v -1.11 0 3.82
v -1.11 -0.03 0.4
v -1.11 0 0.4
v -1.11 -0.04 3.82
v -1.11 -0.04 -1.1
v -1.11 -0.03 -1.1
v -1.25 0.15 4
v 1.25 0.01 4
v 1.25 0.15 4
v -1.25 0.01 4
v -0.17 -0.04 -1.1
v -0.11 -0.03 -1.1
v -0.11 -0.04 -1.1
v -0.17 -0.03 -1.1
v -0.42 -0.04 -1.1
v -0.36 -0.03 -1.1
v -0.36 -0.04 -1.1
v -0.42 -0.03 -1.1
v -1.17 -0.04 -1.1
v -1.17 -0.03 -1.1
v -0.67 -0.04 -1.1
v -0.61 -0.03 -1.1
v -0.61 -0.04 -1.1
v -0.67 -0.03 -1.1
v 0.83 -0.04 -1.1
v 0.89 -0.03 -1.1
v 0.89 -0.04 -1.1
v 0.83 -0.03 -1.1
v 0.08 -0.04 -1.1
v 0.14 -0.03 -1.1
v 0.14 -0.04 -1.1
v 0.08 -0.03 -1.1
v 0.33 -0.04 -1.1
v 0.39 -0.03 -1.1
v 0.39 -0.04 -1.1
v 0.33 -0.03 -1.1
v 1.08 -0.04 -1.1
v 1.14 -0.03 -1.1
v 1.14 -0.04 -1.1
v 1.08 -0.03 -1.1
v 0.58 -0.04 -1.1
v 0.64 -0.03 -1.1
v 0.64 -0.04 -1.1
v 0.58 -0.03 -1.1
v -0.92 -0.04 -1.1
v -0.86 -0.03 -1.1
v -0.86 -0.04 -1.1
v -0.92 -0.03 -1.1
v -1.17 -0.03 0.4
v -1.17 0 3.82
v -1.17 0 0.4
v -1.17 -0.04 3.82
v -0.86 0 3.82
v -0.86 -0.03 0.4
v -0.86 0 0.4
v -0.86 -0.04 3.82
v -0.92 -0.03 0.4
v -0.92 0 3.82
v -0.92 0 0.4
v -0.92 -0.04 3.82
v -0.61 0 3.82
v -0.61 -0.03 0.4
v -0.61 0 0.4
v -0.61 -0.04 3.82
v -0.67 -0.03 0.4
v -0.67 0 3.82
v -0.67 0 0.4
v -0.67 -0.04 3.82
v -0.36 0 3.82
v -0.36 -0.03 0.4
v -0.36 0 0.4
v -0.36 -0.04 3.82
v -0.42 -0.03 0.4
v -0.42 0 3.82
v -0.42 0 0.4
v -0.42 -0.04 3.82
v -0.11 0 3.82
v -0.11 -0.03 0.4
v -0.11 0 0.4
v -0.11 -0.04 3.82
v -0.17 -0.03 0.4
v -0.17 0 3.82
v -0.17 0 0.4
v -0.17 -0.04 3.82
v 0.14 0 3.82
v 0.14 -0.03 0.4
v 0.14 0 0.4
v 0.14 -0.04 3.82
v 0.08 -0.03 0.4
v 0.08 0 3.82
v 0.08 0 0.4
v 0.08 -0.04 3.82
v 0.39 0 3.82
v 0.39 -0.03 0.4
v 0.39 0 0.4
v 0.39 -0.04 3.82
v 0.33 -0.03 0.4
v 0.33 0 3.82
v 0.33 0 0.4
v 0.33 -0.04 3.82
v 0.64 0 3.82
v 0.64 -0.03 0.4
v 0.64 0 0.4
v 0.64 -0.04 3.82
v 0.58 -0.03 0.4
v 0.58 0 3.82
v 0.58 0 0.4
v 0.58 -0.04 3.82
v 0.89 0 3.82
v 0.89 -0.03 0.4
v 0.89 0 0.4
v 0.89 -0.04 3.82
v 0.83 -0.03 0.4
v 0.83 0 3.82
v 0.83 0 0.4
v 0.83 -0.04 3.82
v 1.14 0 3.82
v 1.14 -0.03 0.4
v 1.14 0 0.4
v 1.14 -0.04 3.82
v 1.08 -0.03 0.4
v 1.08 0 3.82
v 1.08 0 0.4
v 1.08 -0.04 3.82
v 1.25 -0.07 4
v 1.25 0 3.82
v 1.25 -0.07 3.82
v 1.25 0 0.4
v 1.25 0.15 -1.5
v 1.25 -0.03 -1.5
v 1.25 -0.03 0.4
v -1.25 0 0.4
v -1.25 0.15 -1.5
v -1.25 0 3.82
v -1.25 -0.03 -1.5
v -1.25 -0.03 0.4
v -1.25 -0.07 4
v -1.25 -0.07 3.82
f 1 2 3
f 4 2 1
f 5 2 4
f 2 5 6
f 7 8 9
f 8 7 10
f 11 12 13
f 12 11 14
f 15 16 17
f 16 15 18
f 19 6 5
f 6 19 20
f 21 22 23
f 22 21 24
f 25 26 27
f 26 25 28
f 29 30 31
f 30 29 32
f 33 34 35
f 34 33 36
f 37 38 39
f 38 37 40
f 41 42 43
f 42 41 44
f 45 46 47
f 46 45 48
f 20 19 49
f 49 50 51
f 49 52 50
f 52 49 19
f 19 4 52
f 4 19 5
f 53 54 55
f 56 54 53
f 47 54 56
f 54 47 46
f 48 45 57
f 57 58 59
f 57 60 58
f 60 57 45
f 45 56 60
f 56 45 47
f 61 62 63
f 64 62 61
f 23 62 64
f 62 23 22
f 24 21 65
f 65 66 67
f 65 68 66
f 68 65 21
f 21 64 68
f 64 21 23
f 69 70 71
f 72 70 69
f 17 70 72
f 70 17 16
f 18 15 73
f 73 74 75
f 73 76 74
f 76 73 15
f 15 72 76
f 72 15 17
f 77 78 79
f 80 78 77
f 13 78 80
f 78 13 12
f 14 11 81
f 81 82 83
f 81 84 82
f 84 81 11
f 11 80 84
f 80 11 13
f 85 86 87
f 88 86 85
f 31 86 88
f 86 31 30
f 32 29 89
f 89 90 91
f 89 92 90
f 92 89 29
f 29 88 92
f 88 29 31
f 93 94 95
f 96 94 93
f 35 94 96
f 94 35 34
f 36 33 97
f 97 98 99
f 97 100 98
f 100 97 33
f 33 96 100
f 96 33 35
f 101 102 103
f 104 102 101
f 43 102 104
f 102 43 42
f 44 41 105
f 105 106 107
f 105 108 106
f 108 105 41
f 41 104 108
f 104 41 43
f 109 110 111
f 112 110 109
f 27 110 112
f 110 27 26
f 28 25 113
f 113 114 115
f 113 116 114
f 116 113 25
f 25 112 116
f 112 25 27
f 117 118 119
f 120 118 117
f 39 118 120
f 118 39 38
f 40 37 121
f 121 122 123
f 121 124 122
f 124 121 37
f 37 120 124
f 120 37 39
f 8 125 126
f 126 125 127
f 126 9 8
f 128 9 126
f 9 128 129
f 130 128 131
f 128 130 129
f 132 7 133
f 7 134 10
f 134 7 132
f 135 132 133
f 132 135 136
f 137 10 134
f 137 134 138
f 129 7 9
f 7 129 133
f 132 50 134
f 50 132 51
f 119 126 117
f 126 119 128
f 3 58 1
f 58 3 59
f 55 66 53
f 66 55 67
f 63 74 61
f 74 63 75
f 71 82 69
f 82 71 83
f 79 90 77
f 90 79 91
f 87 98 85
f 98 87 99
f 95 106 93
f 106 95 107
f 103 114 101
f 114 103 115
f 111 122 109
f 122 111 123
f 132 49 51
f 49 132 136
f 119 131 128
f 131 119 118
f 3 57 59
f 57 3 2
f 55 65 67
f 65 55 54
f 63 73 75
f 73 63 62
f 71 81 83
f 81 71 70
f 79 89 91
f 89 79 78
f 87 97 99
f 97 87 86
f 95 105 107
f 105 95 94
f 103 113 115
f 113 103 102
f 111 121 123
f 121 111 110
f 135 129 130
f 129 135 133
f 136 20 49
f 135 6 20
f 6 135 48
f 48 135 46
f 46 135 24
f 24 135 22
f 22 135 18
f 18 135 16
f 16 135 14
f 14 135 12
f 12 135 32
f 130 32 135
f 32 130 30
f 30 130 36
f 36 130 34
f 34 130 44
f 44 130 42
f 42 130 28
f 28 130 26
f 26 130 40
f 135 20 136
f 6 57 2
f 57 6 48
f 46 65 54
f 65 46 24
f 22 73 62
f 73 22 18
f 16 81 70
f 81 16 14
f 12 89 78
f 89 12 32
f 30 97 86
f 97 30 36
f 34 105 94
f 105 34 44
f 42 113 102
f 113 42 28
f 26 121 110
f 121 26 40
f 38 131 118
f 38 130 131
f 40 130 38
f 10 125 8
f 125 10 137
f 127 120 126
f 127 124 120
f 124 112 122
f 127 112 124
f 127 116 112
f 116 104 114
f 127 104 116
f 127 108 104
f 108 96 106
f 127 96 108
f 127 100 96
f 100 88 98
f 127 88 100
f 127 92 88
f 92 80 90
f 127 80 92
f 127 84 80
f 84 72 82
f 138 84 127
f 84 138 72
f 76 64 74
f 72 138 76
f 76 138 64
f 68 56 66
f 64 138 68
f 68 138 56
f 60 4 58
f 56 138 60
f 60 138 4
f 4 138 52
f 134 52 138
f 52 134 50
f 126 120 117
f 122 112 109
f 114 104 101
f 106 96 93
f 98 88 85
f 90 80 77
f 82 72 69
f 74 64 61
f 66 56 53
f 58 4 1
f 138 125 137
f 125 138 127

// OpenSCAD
// Shed shell kit: wall. See lib/lodge_kit.scad.
include <lib/lodge_kit.scad>
kind = "shed";
wall_panel();
